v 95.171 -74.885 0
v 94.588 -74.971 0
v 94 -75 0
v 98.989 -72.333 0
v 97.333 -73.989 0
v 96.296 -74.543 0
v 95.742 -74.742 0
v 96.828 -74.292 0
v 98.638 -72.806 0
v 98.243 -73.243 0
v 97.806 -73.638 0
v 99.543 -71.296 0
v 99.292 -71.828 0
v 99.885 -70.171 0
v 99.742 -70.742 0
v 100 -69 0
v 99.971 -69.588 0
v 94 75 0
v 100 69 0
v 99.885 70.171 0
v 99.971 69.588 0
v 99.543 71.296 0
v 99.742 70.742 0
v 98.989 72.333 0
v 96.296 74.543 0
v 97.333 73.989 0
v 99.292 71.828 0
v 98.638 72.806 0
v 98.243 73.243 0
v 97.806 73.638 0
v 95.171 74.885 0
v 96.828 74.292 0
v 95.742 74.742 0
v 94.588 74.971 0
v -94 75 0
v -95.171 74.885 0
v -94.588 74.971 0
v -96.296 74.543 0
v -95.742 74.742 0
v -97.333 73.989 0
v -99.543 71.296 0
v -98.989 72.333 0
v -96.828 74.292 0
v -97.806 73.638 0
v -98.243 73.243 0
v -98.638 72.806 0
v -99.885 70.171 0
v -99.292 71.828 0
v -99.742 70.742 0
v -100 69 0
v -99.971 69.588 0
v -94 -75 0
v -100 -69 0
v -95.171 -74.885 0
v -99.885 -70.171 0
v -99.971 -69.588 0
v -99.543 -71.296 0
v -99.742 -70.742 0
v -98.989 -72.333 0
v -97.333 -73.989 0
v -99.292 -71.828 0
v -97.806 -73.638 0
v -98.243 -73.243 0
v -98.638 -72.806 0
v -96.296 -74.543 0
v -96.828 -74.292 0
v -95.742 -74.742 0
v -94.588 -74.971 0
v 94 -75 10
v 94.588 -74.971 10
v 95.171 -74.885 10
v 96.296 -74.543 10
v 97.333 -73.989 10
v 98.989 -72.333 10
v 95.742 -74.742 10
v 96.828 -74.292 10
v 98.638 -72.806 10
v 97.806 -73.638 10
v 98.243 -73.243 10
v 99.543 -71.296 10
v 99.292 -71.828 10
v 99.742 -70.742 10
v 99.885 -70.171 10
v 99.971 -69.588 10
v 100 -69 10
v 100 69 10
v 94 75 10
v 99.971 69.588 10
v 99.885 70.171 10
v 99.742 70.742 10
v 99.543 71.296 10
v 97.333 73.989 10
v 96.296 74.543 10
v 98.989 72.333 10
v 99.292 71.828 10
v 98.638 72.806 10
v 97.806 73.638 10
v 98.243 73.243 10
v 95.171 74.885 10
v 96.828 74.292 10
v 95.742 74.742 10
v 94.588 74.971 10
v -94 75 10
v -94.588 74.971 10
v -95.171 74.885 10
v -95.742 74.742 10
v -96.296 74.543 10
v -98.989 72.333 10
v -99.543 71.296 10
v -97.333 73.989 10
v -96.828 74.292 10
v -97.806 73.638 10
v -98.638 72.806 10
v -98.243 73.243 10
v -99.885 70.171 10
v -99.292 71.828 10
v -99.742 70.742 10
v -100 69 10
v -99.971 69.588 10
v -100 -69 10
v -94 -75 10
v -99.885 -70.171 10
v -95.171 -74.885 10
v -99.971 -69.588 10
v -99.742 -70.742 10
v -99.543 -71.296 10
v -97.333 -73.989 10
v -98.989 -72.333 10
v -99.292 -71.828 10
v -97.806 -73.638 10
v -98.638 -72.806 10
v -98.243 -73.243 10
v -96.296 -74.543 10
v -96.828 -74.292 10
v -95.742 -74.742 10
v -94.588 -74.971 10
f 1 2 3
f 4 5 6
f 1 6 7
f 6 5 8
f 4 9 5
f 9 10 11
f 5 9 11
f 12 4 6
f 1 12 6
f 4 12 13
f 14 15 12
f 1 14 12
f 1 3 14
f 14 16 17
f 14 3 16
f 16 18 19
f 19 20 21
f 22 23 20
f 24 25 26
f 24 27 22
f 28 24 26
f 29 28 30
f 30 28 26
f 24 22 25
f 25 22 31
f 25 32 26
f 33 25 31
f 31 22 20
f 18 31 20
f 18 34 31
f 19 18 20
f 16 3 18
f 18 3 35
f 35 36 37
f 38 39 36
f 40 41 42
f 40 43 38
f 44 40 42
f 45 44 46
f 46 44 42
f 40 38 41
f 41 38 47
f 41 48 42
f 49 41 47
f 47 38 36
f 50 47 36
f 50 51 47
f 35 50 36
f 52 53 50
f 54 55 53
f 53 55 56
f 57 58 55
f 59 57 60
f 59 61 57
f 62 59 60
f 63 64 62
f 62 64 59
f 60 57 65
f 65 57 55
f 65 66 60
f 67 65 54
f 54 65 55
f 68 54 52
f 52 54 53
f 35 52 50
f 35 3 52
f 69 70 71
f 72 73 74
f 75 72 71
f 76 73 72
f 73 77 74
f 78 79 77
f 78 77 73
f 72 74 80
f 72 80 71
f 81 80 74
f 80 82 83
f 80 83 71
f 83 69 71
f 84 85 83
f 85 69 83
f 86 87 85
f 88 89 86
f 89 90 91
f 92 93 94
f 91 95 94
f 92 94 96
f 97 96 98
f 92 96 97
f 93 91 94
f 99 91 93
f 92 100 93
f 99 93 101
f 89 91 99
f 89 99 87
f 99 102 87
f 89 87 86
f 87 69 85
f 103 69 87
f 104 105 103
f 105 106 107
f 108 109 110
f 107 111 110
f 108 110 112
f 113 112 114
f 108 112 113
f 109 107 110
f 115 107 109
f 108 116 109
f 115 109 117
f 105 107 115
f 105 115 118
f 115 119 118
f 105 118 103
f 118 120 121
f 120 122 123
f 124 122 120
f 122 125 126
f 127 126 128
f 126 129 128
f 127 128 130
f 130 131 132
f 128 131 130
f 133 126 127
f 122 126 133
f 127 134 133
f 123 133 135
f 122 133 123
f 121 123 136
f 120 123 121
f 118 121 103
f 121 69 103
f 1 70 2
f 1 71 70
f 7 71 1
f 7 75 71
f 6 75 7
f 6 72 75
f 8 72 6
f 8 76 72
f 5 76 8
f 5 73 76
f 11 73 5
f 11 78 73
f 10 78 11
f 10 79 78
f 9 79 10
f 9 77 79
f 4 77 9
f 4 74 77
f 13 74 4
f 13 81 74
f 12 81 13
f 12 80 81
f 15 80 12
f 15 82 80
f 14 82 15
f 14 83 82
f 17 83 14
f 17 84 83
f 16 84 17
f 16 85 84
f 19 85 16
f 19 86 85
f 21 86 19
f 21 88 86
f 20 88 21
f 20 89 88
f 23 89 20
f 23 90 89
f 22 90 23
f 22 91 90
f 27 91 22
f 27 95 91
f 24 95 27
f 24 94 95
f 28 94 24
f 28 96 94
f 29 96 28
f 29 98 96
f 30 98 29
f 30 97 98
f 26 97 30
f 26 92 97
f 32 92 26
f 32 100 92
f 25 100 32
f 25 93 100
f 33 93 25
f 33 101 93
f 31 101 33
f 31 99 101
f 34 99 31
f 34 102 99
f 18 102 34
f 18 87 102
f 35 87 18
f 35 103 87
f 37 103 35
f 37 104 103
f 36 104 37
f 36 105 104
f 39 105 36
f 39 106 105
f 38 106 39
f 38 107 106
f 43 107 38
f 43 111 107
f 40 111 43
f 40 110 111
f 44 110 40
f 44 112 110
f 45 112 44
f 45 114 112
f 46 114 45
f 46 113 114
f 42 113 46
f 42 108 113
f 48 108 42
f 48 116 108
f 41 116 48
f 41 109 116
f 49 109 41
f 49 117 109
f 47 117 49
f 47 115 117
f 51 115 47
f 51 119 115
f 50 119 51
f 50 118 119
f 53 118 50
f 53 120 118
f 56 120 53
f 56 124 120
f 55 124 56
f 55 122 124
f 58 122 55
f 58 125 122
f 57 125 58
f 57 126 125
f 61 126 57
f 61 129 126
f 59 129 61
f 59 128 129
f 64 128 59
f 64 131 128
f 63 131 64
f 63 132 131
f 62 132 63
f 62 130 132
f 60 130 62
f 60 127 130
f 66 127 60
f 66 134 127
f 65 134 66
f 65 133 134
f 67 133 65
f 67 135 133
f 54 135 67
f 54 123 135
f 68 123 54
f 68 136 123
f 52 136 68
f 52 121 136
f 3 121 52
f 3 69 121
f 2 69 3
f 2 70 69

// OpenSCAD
$fn=64;

module tooling_plate(length=200, width=150, thickness=10, corner_r=6) {
    corner_r2 = min(corner_r, min(length, width)/2);
    translate([0,0,thickness/2])
    linear_extrude(height=thickness, center=true)
        offset(r=corner_r2)
            square([length-2*corner_r2, width-2*corner_r2], center=true);
}

tooling_plate();
